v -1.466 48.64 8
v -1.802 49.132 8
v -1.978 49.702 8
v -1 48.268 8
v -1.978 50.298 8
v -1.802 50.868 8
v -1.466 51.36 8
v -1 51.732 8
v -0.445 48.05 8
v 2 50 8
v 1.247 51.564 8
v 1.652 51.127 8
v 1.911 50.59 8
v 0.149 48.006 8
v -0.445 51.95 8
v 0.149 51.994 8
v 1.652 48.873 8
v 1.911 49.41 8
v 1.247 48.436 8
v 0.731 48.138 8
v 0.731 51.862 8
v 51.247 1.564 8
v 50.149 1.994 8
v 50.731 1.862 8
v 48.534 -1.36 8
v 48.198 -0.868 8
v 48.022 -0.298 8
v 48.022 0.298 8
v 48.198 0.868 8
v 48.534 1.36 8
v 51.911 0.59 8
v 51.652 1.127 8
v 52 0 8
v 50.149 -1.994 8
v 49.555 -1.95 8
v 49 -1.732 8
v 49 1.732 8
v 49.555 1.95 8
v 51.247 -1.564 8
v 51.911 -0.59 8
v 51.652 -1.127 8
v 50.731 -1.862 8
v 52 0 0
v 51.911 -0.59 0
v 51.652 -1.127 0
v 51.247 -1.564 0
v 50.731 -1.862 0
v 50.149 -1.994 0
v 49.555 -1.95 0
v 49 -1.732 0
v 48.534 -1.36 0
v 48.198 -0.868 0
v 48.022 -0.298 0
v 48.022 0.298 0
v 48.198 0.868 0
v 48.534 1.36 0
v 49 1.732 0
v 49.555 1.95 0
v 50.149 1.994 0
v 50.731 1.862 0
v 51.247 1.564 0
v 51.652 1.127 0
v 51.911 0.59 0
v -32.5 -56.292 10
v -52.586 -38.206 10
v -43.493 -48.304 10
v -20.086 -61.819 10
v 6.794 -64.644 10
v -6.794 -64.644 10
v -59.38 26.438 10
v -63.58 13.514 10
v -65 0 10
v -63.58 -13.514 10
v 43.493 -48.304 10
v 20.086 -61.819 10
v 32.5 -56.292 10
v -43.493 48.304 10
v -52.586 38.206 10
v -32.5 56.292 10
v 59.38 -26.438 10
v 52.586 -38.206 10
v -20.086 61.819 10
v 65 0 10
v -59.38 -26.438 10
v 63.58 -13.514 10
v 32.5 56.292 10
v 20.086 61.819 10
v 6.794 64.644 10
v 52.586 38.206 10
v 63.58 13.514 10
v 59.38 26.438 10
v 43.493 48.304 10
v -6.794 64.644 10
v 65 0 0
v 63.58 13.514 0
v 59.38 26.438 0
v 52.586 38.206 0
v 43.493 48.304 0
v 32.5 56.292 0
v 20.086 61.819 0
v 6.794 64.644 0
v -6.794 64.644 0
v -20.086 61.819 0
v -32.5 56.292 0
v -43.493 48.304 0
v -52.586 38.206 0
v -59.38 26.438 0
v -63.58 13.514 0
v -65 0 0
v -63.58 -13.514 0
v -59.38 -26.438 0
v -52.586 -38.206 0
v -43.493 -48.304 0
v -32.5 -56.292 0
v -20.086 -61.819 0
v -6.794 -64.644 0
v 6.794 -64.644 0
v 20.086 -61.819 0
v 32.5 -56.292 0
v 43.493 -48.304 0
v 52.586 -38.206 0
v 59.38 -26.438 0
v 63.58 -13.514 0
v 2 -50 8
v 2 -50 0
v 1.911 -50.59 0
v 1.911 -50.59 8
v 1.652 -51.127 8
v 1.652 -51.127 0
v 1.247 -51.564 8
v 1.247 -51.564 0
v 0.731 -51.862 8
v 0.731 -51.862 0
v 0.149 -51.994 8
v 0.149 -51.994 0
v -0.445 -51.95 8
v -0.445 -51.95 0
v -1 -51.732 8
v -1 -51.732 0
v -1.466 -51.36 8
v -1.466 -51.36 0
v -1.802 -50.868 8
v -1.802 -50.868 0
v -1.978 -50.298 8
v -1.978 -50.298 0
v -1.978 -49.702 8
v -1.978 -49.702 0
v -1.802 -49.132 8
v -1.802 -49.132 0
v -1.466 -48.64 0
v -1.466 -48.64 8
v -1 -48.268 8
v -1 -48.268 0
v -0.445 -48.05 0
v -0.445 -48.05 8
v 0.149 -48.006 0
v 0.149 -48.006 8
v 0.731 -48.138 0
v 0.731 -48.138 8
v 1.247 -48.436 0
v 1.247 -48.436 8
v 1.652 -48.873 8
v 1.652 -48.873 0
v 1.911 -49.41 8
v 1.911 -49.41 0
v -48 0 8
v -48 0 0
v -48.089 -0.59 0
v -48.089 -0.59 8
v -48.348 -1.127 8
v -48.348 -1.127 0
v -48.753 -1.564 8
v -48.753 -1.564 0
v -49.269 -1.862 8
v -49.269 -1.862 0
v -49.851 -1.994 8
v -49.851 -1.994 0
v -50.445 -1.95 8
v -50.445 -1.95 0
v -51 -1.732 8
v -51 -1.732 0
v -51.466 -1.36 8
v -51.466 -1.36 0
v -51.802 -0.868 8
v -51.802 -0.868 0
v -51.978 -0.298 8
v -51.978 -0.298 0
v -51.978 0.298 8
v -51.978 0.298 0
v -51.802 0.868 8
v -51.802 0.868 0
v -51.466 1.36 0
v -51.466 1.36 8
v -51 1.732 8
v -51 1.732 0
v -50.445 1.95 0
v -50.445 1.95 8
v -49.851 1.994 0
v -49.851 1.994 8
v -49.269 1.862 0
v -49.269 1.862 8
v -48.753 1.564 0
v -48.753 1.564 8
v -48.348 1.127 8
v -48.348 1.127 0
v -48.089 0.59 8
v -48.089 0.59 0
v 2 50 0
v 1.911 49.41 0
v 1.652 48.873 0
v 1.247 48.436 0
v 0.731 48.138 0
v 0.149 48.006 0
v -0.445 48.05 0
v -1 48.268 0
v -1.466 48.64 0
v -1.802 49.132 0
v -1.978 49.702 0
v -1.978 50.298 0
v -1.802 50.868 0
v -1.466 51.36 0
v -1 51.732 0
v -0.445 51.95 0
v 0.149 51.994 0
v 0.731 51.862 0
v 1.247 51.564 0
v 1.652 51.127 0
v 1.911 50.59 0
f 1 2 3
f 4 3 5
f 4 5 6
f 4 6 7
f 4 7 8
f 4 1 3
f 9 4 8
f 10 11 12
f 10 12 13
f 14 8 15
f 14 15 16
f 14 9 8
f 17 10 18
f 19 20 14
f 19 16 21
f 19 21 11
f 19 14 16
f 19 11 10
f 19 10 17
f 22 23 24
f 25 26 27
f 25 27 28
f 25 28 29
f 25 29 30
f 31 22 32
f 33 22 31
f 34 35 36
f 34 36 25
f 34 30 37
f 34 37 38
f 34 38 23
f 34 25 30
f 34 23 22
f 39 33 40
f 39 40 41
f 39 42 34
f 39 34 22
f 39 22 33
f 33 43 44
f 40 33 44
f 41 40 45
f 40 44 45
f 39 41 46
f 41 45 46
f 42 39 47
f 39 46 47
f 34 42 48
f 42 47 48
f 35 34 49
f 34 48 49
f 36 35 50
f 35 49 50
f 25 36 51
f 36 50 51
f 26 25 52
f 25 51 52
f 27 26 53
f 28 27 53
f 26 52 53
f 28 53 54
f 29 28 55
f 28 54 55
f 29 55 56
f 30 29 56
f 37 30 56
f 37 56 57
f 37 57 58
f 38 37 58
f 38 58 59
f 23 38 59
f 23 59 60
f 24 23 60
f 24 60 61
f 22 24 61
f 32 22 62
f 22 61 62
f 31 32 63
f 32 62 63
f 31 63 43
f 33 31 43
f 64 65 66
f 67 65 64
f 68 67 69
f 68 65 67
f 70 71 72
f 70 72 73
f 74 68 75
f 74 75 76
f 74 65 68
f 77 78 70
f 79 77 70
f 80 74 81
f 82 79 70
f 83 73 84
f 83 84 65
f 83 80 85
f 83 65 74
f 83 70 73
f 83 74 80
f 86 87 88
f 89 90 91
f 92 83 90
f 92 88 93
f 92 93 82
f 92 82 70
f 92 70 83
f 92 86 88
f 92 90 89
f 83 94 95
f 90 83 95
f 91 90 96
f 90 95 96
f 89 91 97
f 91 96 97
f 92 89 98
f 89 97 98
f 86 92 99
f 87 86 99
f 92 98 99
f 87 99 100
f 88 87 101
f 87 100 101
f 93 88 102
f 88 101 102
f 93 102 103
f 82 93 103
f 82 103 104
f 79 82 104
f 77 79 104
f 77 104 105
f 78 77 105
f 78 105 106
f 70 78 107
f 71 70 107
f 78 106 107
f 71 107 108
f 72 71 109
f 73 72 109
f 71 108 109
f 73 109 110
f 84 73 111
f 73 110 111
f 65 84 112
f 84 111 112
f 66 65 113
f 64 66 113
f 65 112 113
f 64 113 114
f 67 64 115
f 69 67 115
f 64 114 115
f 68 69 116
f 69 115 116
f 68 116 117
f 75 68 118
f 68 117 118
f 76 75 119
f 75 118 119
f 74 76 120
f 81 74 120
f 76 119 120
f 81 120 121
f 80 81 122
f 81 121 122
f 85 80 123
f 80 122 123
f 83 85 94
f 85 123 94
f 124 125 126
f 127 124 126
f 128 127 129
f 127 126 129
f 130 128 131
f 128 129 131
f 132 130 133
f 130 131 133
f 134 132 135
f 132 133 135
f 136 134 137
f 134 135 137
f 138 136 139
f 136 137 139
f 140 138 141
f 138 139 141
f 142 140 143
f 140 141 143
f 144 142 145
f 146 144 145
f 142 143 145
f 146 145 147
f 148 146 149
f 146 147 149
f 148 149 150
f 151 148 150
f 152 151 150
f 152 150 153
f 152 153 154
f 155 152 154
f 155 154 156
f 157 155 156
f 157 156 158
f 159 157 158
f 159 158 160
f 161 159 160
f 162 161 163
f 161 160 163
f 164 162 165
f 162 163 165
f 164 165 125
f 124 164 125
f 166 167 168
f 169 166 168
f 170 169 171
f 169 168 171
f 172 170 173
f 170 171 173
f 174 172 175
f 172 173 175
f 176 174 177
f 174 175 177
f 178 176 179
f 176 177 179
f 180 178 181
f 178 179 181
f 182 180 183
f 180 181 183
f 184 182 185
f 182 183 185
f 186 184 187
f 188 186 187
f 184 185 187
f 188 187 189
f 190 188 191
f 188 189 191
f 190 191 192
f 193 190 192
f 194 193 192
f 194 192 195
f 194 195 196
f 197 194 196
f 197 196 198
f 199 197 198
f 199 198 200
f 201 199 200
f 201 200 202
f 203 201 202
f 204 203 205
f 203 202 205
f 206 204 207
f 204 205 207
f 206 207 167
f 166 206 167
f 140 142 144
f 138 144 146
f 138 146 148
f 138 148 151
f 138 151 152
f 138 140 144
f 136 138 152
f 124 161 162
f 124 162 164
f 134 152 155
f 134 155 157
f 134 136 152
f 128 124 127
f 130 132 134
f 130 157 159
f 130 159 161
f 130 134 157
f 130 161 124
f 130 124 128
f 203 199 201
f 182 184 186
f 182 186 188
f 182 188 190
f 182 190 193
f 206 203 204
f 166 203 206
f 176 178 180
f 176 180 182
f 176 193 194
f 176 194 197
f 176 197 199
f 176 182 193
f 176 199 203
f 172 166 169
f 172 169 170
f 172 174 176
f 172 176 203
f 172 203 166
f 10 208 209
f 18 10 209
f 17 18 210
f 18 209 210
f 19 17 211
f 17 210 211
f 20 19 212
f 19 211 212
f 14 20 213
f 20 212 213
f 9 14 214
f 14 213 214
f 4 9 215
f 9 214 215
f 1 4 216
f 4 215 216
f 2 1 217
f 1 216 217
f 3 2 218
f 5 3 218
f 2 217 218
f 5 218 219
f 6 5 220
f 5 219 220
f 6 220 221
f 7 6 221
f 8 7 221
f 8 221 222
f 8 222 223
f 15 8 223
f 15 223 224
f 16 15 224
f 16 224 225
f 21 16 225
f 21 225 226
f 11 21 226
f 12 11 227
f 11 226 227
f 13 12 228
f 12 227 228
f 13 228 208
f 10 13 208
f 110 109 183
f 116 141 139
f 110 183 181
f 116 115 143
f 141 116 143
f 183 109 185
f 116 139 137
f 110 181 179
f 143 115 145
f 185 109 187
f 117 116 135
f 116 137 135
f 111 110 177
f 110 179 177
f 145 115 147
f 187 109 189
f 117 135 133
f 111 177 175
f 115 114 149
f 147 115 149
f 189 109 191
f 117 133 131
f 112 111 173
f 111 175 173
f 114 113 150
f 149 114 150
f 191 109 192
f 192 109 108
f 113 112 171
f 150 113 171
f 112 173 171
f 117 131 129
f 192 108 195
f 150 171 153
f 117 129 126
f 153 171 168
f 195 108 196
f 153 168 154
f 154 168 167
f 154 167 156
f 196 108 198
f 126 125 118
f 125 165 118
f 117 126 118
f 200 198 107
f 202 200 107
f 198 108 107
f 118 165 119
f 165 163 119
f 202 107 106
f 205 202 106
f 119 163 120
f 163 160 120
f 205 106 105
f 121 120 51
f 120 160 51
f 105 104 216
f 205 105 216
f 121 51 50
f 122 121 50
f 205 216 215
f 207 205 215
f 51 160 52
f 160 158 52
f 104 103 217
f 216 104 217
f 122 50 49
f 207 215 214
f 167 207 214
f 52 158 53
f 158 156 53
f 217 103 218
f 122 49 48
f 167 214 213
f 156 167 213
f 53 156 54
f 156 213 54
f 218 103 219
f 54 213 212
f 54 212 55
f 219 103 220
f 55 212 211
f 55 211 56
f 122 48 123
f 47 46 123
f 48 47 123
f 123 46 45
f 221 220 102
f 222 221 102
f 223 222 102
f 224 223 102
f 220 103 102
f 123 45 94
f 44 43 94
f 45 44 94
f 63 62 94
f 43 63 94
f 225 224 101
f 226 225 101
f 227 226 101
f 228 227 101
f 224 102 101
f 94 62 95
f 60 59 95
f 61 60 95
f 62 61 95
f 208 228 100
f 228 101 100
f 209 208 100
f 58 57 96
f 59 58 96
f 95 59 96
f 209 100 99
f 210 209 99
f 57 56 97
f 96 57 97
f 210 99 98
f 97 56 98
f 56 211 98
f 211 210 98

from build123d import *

# Parameters (mm, degrees)
F0_R     = 65
F1_DEPTH = 10
F2_R     = 2
F3_DEPTH = 8


with BuildPart() as f1:
    # F0 (on Top) → F1 (new body)
    with BuildSketch(Plane.XY):
        Circle(F0_R)
    extrude(amount=F1_DEPTH)

    # F2 (on face) → F3 (cut)
    with BuildSketch(Plane(origin=(0, 0, 0), x_dir=(1, 0, 0), z_dir=(0, 0, -1))):
        with Locations((0, 50)):
            Circle(F2_R)
        with Locations((50, 0)):
            Circle(F2_R)
        with Locations((0, -50)):
            Circle(F2_R)
        with Locations((-50, 0)):
            Circle(F2_R)
    extrude(amount=-F3_DEPTH, mode=Mode.SUBTRACT)


solid = f1.part
